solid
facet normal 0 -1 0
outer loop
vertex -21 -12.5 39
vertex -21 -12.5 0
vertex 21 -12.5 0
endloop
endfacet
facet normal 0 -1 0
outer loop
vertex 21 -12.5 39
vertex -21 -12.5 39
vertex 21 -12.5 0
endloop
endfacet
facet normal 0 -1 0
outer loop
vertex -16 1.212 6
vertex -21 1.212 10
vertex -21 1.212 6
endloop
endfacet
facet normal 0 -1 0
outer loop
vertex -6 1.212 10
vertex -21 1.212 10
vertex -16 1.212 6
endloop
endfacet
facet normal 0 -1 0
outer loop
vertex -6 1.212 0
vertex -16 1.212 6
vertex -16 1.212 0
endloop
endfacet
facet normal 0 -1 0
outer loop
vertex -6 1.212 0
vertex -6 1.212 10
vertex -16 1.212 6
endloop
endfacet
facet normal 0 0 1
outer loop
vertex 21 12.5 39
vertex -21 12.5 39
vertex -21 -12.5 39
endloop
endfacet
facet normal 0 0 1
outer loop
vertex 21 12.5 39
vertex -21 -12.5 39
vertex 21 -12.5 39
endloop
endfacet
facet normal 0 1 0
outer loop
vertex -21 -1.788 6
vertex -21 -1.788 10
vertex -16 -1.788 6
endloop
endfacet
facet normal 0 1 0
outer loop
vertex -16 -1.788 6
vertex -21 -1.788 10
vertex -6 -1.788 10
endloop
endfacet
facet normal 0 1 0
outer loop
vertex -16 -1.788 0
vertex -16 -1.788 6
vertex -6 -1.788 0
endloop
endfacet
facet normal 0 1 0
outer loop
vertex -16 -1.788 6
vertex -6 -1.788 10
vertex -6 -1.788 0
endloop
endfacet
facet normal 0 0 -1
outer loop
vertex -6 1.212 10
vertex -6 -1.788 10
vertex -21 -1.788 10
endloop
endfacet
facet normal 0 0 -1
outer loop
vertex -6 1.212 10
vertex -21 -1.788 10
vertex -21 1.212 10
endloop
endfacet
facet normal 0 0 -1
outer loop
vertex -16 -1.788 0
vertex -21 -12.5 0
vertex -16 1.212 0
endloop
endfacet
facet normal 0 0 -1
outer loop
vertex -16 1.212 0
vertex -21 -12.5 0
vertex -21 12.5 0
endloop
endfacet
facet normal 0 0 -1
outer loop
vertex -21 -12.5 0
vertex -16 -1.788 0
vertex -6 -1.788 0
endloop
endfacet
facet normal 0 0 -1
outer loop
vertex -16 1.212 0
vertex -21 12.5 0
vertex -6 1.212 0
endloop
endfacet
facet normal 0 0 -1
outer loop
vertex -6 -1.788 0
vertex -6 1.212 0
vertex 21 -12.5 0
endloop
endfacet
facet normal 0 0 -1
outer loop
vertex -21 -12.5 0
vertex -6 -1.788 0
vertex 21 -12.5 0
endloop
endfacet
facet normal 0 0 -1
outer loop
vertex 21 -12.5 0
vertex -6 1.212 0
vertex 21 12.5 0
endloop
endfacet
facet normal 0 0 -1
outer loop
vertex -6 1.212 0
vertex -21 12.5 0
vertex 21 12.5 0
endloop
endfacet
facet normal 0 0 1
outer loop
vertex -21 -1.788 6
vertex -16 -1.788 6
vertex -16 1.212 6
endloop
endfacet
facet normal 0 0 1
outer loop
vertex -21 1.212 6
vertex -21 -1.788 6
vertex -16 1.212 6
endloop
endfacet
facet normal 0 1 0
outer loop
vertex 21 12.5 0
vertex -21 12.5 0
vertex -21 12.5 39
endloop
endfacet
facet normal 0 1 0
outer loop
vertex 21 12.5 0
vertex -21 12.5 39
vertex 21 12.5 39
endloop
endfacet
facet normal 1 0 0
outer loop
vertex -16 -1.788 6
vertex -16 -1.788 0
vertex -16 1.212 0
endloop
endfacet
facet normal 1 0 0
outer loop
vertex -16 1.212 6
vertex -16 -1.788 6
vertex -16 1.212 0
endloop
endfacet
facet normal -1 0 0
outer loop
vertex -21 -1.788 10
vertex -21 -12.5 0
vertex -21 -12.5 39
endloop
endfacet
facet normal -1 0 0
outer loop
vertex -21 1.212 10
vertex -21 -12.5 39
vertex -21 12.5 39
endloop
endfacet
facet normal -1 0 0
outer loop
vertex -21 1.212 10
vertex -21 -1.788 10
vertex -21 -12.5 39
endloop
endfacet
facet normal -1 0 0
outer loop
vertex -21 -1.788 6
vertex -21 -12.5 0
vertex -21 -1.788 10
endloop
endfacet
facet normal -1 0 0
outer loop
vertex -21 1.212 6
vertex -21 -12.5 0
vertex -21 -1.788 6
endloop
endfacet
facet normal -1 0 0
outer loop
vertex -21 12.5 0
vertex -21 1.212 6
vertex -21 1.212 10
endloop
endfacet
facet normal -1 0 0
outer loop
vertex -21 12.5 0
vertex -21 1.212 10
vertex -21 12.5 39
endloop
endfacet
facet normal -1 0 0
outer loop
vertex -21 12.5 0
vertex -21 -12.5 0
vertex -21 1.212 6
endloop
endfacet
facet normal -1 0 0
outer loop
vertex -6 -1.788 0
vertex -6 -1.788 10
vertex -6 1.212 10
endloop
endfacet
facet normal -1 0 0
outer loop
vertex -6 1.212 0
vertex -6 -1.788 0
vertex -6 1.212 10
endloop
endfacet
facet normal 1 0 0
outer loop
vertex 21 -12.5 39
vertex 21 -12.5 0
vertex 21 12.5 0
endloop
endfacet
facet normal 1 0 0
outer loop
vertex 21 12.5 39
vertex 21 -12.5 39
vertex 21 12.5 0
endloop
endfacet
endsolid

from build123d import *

# Parameters (mm, degrees)
ESQUISSE1_W             = 42
ESQUISSE1_H             = 25
BOSS_EXTRU_1_DEPTH      = 39
ESQUISSE2_W             = 10
ESQUISSE2_H             = 3
ENL_V_MAT_EXTRU_1_DEPTH = 10
ESQUISSE3_W             = 4
ESQUISSE3_H             = 3
ENL_V_MAT_EXTRU_2_DEPTH = 10


with BuildPart() as part:
    # Esquisse1 → Boss.-Extru.1 (new body)
    with BuildSketch(Plane.XY):
        Rectangle(ESQUISSE1_W, ESQUISSE1_H)
    extrude(amount=BOSS_EXTRU_1_DEPTH)

    # Esquisse2 → Enlèv. mat.-Extru.1 (cut)
    with BuildSketch(Plane(origin=(0, 0, 0), x_dir=(-1, 0, 0), z_dir=(0, 0, -1))):
        with Locations((11, -0.28777271)):
            Rectangle(ESQUISSE2_W, ESQUISSE2_H)
    extrude(amount=-ENL_V_MAT_EXTRU_1_DEPTH, mode=Mode.SUBTRACT)

    # Esquisse3 → Enlèv. mat.-Extru.2 (cut)
    with BuildSketch(Plane(origin=(-16, 0, 0), x_dir=(0, 0, -1), z_dir=(1, 0, 0))):
        with Locations((-8, -0.28777271)):
            Rectangle(ESQUISSE3_W, ESQUISSE3_H)
    extrude(amount=-ENL_V_MAT_EXTRU_2_DEPTH, mode=Mode.SUBTRACT)


solid = part.part
